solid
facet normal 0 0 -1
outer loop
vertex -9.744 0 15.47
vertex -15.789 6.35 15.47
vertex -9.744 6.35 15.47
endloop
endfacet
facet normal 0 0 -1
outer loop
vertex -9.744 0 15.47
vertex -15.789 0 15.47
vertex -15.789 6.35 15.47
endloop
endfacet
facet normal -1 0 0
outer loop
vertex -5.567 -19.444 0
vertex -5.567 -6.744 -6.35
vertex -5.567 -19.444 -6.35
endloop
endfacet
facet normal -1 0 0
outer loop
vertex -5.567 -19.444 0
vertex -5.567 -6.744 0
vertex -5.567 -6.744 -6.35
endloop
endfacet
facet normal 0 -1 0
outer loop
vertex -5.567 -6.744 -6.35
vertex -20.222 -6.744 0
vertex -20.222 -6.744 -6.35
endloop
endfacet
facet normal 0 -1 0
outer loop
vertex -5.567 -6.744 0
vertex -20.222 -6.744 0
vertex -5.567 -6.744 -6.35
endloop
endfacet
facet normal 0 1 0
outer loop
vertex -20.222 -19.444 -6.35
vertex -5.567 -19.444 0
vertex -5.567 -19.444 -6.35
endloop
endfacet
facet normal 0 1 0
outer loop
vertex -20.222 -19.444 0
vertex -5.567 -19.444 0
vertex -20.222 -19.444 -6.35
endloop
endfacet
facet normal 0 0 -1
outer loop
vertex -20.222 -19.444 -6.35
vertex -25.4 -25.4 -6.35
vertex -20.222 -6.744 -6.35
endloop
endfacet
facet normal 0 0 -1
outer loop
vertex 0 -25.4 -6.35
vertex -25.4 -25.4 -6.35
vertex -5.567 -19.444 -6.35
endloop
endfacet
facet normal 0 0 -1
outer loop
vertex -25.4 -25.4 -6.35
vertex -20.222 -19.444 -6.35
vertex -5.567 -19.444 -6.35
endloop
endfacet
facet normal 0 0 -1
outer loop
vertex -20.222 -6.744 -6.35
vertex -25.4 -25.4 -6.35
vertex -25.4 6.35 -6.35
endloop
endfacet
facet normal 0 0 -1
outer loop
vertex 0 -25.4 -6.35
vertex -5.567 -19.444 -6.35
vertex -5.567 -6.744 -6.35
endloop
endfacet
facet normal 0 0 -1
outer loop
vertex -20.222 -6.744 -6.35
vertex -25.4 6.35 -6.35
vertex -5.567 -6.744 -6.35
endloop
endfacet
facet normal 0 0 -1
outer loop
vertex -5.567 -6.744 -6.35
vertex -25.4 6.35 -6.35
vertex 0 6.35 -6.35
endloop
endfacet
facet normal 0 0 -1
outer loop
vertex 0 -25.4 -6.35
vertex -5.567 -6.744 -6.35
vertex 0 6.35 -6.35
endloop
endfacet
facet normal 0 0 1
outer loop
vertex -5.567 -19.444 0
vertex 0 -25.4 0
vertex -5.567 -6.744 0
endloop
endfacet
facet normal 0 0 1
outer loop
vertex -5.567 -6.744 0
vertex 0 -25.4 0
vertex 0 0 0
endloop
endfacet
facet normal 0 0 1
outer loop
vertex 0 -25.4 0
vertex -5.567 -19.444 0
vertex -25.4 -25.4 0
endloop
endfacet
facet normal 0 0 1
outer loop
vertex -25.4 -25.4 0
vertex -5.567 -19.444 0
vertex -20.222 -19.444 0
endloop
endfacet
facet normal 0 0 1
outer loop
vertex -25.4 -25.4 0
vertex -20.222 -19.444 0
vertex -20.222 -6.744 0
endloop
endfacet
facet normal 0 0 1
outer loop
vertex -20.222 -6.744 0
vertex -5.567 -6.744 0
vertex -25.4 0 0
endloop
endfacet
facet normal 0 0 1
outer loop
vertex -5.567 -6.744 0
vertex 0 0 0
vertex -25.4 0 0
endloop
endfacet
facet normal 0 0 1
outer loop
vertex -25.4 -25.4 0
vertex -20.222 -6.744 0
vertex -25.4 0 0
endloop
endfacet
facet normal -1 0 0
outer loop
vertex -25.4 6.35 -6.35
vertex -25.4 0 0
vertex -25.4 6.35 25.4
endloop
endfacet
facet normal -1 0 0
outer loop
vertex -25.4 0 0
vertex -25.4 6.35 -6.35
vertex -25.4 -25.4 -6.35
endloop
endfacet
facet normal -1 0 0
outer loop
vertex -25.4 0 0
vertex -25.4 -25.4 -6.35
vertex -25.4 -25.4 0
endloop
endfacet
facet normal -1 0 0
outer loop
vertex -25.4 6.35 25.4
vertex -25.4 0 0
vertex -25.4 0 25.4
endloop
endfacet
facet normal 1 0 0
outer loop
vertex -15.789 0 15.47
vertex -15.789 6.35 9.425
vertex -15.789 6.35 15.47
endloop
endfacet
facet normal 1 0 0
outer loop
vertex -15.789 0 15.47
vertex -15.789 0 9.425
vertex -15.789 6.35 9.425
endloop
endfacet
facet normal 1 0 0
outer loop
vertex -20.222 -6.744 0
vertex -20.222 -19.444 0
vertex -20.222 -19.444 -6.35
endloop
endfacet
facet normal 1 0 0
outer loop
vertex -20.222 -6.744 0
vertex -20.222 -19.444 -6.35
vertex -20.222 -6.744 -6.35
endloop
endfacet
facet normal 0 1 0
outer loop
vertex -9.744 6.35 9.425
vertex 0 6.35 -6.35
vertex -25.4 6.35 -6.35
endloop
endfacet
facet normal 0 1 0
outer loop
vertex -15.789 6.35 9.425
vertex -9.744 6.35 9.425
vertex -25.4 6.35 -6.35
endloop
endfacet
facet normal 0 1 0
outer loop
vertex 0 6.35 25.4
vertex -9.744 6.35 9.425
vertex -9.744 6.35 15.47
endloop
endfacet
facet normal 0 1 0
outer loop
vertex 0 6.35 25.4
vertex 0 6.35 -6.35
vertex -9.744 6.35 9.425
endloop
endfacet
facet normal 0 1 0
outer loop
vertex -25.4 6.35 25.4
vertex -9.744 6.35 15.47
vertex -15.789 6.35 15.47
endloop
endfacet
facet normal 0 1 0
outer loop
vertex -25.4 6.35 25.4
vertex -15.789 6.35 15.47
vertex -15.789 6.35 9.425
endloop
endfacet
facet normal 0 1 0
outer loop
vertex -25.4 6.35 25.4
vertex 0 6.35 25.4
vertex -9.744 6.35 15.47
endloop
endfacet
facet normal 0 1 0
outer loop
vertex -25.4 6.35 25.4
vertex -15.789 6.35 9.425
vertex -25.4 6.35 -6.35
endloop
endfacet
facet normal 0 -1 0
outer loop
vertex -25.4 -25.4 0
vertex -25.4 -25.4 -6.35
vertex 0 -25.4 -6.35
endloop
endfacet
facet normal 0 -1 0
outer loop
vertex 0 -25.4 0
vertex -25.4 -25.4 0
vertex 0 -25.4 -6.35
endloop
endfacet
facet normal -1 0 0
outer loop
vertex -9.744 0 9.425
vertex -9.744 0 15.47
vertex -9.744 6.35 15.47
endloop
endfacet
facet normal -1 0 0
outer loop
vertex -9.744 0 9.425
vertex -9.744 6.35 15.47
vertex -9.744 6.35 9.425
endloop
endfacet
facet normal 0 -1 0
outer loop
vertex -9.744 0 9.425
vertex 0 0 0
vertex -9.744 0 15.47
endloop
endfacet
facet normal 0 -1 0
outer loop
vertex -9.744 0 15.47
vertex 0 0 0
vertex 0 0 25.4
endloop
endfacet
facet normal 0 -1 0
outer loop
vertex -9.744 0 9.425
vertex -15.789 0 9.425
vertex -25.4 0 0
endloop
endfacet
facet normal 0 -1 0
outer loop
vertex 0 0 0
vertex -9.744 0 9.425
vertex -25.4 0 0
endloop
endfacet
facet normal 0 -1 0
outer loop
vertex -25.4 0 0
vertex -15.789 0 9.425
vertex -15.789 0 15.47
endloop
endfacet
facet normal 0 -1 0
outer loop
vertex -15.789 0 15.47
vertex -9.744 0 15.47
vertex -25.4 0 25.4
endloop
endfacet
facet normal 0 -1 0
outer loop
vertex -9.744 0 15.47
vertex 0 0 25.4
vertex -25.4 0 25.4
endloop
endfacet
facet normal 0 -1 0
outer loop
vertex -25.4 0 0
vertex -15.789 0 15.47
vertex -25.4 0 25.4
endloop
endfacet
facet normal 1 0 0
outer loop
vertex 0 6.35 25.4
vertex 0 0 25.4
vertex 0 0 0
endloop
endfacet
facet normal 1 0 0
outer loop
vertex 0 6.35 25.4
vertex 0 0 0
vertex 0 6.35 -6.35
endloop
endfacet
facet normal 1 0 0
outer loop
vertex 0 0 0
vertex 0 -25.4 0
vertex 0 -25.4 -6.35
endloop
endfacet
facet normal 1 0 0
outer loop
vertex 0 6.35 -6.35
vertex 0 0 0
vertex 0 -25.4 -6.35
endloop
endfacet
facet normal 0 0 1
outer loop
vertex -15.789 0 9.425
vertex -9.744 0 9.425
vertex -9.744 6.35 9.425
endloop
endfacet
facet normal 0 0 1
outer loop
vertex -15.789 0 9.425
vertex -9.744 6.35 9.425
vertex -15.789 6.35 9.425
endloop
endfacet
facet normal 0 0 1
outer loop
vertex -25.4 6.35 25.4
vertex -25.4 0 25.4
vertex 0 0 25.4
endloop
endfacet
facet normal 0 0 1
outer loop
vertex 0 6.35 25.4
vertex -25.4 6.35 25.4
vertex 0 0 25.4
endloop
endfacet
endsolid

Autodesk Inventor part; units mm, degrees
ref_plane "YZ Plane" through (0, 0, 0) normal (1, 0, 0) x (0, 1, 0)
ref_plane "XZ Plane" through (0, 0, 0) normal (0, 1, 0) x (-1, 0, 0)
ref_plane "XY Plane" through (0, 0, 0) normal (0, 0, 1) x (1, 0, 0)
sketch "Sketch1" plane through (0, 0, 0) normal (0, 1, 0) x (-1, 0, 0)
  line L0 (0, 0) -> (25.4, 0)
  line L1 (25.4, 0) -> (25.4, 25.4)
  line L2 (25.4, 25.4) -> (0, 25.4)
  line L3 (0, 25.4) -> (0, 0)
  dimension "d0" = 25.4
  dimension "d1" = 25.4
extrude "Extrusion1" add sketch "Sketch1" along normal blind 6.35
sketch "Sketch2" plane through (0, 6.35, 0) normal (0, 1, 0) x (1, 0, 0)
  line L0 (0, 0) -> (-25.4, 0) projected
  line L1 (0, 0) -> (-25.4, 0)
  line L2 (-25.4, 0) -> (-25.4, 6.35)
  line L3 (-25.4, 6.35) -> (0, 6.35)
  line L4 (0, 6.35) -> (0, 0)
  dimension "d4" = 6.35
extrude "Extrusion2" add sketch "Sketch2" against normal blind 31.75
sketch "Sketch3" plane through (-25.4, 0, 0) normal (0, 0, 1) x (1, 0, 0)
  line L0 (5.1775, -6.7435) -> (19.8333, -6.7435)
  line L1 (19.8333, -6.7435) -> (19.8333, -19.4435)
  line L2 (19.8333, -19.4435) -> (5.1775, -19.4435)
  line L3 (5.1775, -19.4435) -> (5.1775, -6.7435)
  line L4 (5.1775, -6.7435) -> (19.8333, -19.4435) construction
  line L5 (19.8333, -6.7435) -> (5.1775, -19.4435) construction
  point P0 (25.4, 0)
  point P1 (12.5054, -13.0935)
  dimension "d7" = 14.6558
  dimension "d8" = 12.7
extrude "Extrusion3" cut sketch "Sketch3" against normal blind 31.75
sketch "Sketch4" plane through (0, 0, 0) normal (0, -1, 0) x (1, 0, 0)
  line L0 (-15.7889, 15.4698) -> (-9.7437, 15.4698)
  line L1 (-9.7437, 15.4698) -> (-9.7437, 9.4246)
  line L2 (-9.7437, 9.4246) -> (-15.7889, 9.4246)
  line L3 (-15.7889, 9.4246) -> (-15.7889, 15.4698)
  line L4 (-15.7889, 15.4698) -> (-9.7437, 9.4246) construction
  line L5 (-9.7437, 15.4698) -> (-15.7889, 9.4246) construction
  point P0 (0, 0)
  point P1 (-12.7663, 12.4472)
  dimension "d11" = 6.0452
  dimension "d12" = 6.0452
extrude "Extrusion4" cut sketch "Sketch4" against normal blind 25.4
properties part number "l braket w. squares"
